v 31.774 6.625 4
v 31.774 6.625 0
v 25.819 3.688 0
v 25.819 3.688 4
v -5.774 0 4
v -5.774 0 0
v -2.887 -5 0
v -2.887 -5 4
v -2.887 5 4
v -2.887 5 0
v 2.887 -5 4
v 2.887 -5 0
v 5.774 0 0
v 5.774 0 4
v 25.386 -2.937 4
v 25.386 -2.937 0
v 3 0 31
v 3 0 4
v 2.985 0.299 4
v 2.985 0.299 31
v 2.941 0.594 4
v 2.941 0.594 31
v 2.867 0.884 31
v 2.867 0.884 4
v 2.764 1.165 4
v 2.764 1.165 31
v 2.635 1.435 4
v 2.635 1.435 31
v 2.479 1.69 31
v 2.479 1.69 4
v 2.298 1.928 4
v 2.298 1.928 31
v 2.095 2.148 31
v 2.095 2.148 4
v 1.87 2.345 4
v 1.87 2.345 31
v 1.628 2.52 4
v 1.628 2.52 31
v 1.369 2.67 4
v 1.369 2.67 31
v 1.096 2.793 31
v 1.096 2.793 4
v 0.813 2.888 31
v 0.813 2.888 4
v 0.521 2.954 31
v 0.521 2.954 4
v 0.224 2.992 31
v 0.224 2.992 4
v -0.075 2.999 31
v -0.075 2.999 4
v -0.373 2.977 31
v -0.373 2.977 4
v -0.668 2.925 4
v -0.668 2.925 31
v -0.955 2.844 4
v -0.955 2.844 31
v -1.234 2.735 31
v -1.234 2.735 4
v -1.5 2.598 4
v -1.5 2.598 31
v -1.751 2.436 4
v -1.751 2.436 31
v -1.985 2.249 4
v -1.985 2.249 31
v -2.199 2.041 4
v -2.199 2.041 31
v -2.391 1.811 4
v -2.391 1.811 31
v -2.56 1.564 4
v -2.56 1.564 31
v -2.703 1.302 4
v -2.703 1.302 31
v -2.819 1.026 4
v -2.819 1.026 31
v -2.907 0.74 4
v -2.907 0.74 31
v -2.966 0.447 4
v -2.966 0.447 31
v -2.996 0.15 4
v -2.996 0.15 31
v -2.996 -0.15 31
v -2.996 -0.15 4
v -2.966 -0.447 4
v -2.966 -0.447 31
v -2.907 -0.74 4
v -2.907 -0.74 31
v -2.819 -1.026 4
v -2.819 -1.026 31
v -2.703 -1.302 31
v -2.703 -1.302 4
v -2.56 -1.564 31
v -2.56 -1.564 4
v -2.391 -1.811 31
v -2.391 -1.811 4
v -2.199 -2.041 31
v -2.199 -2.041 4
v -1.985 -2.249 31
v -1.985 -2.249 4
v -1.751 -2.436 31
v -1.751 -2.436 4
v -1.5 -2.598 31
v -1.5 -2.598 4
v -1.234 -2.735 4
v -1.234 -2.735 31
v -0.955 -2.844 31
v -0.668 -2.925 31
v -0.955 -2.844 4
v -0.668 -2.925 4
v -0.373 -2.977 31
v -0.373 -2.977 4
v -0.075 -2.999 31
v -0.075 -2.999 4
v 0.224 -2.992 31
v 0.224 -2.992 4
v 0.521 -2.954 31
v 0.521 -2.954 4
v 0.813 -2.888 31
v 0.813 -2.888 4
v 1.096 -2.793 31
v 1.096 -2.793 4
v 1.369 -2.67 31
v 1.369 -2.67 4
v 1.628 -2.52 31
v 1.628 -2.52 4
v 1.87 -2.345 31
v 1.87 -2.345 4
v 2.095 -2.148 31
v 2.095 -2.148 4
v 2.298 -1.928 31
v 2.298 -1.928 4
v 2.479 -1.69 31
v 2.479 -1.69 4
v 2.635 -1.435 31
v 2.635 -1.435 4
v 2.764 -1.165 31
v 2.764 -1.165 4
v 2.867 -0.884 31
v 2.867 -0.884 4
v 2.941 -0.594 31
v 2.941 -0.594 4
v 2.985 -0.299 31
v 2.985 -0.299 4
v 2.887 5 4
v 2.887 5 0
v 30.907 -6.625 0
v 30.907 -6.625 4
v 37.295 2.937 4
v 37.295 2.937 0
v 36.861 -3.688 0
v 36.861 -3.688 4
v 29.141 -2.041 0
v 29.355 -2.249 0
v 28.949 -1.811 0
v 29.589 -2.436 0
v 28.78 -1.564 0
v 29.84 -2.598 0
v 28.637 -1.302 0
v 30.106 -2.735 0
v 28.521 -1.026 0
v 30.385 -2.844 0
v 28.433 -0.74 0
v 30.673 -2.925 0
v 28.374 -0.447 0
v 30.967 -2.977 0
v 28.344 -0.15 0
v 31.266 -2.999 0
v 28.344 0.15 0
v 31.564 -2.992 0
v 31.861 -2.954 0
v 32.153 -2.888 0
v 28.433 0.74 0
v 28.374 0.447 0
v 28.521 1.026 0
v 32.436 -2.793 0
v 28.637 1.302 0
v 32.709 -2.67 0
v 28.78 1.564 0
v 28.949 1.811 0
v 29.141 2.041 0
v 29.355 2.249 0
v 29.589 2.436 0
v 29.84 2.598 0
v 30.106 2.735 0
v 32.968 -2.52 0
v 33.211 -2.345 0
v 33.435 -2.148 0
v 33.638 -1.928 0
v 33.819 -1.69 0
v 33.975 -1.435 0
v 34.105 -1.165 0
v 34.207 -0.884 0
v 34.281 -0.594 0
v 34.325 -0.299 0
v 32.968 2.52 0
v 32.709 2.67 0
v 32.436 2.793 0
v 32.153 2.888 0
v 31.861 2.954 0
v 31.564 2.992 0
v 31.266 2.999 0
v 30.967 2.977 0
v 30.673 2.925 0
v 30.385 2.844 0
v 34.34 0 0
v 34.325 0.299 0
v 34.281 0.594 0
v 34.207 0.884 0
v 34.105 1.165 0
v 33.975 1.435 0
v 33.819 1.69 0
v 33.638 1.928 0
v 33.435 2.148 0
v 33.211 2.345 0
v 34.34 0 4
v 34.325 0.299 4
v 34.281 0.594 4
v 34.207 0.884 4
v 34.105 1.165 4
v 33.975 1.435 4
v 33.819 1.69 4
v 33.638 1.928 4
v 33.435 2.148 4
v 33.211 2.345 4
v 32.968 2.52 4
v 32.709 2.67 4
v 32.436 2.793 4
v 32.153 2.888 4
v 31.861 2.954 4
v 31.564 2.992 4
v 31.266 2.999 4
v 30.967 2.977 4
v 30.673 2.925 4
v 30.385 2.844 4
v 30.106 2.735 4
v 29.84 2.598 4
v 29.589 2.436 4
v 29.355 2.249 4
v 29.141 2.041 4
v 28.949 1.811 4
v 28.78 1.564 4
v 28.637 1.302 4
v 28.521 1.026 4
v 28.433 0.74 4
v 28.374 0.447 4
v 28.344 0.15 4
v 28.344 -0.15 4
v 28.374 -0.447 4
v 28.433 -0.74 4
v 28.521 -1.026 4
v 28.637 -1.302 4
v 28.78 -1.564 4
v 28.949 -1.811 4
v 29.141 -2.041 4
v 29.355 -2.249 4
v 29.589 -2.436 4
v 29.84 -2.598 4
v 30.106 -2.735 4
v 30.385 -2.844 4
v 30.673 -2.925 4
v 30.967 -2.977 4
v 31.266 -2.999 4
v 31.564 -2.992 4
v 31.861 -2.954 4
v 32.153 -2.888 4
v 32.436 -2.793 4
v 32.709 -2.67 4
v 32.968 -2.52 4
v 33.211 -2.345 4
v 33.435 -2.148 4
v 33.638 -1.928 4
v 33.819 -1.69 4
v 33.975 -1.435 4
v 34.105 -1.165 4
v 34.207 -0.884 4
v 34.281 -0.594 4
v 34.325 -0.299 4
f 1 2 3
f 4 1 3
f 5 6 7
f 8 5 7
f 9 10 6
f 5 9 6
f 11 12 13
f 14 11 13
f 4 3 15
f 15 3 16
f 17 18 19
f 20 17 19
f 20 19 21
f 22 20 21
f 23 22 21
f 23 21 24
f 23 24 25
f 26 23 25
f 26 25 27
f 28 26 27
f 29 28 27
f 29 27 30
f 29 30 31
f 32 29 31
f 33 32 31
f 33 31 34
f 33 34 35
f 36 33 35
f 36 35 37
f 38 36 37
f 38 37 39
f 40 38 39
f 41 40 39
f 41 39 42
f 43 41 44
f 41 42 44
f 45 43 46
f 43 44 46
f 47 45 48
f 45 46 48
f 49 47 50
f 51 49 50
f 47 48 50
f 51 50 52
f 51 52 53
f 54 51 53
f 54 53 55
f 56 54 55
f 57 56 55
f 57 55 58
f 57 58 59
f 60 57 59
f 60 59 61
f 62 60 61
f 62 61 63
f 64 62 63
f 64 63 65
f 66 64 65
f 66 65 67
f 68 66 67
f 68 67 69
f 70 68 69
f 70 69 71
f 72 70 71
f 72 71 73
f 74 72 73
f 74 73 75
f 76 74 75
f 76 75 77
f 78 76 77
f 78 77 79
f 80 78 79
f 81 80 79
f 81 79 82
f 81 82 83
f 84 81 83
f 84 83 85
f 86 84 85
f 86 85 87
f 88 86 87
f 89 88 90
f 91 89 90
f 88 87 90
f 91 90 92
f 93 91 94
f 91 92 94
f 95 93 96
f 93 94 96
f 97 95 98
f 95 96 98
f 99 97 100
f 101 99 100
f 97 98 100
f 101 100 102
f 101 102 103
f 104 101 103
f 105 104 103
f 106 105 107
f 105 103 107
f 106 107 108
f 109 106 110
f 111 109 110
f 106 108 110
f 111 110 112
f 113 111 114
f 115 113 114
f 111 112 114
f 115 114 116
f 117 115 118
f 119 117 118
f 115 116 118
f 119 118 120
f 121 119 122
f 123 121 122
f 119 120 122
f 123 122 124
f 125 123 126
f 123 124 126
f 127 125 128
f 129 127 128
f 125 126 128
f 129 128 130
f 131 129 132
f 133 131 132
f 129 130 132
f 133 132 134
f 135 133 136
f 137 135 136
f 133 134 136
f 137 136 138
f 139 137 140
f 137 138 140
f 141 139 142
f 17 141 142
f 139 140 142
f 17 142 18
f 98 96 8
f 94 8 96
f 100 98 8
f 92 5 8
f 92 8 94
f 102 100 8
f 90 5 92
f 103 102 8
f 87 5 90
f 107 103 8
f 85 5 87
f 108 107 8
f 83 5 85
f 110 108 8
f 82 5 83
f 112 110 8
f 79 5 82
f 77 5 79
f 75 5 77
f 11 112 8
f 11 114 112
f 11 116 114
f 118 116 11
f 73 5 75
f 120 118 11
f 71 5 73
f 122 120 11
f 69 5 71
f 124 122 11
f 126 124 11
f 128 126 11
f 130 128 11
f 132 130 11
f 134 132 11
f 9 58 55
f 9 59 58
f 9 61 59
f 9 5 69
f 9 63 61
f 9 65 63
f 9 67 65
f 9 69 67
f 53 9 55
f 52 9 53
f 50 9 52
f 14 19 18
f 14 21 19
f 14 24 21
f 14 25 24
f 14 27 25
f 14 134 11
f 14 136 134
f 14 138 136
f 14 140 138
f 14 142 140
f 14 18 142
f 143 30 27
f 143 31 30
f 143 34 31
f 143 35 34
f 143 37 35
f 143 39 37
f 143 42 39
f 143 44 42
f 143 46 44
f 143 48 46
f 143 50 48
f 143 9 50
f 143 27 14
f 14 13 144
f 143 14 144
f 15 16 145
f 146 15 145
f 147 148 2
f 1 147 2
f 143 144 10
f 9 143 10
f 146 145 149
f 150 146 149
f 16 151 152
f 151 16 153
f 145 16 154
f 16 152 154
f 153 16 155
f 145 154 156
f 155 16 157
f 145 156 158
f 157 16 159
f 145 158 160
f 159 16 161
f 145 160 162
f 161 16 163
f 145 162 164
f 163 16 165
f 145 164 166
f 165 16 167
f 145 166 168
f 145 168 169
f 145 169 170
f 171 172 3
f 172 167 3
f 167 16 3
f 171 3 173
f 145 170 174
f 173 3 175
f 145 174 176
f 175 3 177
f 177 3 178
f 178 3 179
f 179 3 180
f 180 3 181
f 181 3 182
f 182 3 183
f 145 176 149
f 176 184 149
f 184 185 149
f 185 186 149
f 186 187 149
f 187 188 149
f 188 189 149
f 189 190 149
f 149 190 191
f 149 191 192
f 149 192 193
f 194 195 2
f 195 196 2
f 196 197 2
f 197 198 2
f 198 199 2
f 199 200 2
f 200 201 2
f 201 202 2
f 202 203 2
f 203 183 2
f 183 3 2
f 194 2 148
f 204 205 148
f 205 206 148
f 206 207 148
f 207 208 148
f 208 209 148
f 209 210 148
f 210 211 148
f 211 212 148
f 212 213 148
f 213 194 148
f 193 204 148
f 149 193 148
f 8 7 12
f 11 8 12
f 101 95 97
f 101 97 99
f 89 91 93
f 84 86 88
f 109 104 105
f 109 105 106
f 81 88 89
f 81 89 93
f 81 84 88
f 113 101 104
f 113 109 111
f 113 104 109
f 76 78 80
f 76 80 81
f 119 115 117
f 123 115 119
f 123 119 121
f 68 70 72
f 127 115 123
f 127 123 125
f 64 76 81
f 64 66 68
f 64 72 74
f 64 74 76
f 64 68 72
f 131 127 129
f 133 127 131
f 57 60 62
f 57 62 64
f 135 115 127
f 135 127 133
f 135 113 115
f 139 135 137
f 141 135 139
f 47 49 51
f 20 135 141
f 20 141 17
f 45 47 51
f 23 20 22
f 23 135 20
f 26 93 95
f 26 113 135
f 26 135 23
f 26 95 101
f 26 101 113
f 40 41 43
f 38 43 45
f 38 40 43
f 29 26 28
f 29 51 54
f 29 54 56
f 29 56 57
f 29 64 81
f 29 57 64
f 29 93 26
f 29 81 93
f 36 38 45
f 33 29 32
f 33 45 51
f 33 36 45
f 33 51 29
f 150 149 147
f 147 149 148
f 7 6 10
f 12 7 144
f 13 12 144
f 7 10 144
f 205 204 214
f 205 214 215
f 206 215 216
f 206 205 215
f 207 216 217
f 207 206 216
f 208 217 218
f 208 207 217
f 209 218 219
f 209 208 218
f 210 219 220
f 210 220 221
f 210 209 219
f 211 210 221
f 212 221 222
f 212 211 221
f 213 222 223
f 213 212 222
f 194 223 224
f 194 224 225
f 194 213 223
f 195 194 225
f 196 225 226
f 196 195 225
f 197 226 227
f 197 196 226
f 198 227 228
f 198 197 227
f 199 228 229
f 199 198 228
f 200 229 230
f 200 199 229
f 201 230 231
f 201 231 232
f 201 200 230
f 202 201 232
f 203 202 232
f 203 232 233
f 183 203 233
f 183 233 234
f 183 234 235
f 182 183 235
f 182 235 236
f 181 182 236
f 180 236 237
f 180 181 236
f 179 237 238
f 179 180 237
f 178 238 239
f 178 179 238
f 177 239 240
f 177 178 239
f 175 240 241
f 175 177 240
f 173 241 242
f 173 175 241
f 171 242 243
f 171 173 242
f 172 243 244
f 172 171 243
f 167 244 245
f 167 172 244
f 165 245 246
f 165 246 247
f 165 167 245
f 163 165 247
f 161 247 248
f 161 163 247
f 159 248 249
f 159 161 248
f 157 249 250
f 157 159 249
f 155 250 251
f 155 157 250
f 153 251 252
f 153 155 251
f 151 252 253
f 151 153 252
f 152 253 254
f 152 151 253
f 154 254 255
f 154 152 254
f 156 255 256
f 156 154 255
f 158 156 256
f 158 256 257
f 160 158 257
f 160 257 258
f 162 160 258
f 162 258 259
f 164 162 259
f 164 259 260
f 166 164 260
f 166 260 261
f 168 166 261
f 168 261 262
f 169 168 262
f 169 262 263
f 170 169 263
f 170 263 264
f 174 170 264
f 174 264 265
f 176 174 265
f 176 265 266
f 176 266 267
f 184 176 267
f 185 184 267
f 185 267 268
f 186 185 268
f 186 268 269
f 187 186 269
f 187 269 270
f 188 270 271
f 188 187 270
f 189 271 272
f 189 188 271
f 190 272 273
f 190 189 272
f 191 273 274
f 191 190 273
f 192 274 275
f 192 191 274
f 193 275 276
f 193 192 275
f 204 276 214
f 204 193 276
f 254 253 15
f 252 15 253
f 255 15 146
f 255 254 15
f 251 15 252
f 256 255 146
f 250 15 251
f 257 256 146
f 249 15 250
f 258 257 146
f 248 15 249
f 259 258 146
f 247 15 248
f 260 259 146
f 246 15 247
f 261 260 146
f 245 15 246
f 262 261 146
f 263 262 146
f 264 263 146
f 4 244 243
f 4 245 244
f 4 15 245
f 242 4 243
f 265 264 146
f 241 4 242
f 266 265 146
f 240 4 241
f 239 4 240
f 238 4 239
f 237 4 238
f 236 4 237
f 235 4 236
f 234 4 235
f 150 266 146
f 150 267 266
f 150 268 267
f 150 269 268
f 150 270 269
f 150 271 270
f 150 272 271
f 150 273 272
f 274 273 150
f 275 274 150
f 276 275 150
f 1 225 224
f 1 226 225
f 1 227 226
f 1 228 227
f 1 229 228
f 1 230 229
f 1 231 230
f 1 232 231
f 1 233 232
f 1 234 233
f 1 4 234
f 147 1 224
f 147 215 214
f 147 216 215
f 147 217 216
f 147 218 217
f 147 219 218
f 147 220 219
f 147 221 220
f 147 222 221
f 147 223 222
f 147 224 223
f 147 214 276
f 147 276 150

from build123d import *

# Parameters (mm, degrees)
F0_R     = 3
F1_DEPTH = 31
F2_DEPTH = 4
F3_DEPTH = 4


with BuildPart() as f1:
    # F0 (on Top) → F1 (new body)
    with BuildSketch(Plane.XY):
        Circle(F0_R)
    extrude(amount=F1_DEPTH)

    # F0 (on Top) → F2 (join)
    with BuildSketch(Plane.XY):
        Polygon((2.886751, 5), (-2.886751, 5), (-5.773503, 0), (-2.886751, -5), (2.886751, -5), (5.773503, 0), align=None)
        Circle(F0_R, mode=Mode.SUBTRACT)
    extrude(amount=F2_DEPTH)

    # F0 (on Top) → F3 (join)
    with BuildSketch(Plane.XY):
        Polygon((2.886751, 5), (-2.886751, 5), (-5.773503, 0), (-2.886751, -5), (2.886751, -5), (5.773503, 0), align=None)
        Circle(F0_R, mode=Mode.SUBTRACT)
        Polygon((37.294861, 2.937114), (31.77397, 6.625351), (25.819417, 3.688237), (25.385756, -2.937114), (30.906647, -6.625351), (36.8612, -3.688237), align=None)
        with Locations((31.340308, 0)):
            Circle(F0_R, mode=Mode.SUBTRACT)
    extrude(amount=F3_DEPTH)


solid = f1.part
